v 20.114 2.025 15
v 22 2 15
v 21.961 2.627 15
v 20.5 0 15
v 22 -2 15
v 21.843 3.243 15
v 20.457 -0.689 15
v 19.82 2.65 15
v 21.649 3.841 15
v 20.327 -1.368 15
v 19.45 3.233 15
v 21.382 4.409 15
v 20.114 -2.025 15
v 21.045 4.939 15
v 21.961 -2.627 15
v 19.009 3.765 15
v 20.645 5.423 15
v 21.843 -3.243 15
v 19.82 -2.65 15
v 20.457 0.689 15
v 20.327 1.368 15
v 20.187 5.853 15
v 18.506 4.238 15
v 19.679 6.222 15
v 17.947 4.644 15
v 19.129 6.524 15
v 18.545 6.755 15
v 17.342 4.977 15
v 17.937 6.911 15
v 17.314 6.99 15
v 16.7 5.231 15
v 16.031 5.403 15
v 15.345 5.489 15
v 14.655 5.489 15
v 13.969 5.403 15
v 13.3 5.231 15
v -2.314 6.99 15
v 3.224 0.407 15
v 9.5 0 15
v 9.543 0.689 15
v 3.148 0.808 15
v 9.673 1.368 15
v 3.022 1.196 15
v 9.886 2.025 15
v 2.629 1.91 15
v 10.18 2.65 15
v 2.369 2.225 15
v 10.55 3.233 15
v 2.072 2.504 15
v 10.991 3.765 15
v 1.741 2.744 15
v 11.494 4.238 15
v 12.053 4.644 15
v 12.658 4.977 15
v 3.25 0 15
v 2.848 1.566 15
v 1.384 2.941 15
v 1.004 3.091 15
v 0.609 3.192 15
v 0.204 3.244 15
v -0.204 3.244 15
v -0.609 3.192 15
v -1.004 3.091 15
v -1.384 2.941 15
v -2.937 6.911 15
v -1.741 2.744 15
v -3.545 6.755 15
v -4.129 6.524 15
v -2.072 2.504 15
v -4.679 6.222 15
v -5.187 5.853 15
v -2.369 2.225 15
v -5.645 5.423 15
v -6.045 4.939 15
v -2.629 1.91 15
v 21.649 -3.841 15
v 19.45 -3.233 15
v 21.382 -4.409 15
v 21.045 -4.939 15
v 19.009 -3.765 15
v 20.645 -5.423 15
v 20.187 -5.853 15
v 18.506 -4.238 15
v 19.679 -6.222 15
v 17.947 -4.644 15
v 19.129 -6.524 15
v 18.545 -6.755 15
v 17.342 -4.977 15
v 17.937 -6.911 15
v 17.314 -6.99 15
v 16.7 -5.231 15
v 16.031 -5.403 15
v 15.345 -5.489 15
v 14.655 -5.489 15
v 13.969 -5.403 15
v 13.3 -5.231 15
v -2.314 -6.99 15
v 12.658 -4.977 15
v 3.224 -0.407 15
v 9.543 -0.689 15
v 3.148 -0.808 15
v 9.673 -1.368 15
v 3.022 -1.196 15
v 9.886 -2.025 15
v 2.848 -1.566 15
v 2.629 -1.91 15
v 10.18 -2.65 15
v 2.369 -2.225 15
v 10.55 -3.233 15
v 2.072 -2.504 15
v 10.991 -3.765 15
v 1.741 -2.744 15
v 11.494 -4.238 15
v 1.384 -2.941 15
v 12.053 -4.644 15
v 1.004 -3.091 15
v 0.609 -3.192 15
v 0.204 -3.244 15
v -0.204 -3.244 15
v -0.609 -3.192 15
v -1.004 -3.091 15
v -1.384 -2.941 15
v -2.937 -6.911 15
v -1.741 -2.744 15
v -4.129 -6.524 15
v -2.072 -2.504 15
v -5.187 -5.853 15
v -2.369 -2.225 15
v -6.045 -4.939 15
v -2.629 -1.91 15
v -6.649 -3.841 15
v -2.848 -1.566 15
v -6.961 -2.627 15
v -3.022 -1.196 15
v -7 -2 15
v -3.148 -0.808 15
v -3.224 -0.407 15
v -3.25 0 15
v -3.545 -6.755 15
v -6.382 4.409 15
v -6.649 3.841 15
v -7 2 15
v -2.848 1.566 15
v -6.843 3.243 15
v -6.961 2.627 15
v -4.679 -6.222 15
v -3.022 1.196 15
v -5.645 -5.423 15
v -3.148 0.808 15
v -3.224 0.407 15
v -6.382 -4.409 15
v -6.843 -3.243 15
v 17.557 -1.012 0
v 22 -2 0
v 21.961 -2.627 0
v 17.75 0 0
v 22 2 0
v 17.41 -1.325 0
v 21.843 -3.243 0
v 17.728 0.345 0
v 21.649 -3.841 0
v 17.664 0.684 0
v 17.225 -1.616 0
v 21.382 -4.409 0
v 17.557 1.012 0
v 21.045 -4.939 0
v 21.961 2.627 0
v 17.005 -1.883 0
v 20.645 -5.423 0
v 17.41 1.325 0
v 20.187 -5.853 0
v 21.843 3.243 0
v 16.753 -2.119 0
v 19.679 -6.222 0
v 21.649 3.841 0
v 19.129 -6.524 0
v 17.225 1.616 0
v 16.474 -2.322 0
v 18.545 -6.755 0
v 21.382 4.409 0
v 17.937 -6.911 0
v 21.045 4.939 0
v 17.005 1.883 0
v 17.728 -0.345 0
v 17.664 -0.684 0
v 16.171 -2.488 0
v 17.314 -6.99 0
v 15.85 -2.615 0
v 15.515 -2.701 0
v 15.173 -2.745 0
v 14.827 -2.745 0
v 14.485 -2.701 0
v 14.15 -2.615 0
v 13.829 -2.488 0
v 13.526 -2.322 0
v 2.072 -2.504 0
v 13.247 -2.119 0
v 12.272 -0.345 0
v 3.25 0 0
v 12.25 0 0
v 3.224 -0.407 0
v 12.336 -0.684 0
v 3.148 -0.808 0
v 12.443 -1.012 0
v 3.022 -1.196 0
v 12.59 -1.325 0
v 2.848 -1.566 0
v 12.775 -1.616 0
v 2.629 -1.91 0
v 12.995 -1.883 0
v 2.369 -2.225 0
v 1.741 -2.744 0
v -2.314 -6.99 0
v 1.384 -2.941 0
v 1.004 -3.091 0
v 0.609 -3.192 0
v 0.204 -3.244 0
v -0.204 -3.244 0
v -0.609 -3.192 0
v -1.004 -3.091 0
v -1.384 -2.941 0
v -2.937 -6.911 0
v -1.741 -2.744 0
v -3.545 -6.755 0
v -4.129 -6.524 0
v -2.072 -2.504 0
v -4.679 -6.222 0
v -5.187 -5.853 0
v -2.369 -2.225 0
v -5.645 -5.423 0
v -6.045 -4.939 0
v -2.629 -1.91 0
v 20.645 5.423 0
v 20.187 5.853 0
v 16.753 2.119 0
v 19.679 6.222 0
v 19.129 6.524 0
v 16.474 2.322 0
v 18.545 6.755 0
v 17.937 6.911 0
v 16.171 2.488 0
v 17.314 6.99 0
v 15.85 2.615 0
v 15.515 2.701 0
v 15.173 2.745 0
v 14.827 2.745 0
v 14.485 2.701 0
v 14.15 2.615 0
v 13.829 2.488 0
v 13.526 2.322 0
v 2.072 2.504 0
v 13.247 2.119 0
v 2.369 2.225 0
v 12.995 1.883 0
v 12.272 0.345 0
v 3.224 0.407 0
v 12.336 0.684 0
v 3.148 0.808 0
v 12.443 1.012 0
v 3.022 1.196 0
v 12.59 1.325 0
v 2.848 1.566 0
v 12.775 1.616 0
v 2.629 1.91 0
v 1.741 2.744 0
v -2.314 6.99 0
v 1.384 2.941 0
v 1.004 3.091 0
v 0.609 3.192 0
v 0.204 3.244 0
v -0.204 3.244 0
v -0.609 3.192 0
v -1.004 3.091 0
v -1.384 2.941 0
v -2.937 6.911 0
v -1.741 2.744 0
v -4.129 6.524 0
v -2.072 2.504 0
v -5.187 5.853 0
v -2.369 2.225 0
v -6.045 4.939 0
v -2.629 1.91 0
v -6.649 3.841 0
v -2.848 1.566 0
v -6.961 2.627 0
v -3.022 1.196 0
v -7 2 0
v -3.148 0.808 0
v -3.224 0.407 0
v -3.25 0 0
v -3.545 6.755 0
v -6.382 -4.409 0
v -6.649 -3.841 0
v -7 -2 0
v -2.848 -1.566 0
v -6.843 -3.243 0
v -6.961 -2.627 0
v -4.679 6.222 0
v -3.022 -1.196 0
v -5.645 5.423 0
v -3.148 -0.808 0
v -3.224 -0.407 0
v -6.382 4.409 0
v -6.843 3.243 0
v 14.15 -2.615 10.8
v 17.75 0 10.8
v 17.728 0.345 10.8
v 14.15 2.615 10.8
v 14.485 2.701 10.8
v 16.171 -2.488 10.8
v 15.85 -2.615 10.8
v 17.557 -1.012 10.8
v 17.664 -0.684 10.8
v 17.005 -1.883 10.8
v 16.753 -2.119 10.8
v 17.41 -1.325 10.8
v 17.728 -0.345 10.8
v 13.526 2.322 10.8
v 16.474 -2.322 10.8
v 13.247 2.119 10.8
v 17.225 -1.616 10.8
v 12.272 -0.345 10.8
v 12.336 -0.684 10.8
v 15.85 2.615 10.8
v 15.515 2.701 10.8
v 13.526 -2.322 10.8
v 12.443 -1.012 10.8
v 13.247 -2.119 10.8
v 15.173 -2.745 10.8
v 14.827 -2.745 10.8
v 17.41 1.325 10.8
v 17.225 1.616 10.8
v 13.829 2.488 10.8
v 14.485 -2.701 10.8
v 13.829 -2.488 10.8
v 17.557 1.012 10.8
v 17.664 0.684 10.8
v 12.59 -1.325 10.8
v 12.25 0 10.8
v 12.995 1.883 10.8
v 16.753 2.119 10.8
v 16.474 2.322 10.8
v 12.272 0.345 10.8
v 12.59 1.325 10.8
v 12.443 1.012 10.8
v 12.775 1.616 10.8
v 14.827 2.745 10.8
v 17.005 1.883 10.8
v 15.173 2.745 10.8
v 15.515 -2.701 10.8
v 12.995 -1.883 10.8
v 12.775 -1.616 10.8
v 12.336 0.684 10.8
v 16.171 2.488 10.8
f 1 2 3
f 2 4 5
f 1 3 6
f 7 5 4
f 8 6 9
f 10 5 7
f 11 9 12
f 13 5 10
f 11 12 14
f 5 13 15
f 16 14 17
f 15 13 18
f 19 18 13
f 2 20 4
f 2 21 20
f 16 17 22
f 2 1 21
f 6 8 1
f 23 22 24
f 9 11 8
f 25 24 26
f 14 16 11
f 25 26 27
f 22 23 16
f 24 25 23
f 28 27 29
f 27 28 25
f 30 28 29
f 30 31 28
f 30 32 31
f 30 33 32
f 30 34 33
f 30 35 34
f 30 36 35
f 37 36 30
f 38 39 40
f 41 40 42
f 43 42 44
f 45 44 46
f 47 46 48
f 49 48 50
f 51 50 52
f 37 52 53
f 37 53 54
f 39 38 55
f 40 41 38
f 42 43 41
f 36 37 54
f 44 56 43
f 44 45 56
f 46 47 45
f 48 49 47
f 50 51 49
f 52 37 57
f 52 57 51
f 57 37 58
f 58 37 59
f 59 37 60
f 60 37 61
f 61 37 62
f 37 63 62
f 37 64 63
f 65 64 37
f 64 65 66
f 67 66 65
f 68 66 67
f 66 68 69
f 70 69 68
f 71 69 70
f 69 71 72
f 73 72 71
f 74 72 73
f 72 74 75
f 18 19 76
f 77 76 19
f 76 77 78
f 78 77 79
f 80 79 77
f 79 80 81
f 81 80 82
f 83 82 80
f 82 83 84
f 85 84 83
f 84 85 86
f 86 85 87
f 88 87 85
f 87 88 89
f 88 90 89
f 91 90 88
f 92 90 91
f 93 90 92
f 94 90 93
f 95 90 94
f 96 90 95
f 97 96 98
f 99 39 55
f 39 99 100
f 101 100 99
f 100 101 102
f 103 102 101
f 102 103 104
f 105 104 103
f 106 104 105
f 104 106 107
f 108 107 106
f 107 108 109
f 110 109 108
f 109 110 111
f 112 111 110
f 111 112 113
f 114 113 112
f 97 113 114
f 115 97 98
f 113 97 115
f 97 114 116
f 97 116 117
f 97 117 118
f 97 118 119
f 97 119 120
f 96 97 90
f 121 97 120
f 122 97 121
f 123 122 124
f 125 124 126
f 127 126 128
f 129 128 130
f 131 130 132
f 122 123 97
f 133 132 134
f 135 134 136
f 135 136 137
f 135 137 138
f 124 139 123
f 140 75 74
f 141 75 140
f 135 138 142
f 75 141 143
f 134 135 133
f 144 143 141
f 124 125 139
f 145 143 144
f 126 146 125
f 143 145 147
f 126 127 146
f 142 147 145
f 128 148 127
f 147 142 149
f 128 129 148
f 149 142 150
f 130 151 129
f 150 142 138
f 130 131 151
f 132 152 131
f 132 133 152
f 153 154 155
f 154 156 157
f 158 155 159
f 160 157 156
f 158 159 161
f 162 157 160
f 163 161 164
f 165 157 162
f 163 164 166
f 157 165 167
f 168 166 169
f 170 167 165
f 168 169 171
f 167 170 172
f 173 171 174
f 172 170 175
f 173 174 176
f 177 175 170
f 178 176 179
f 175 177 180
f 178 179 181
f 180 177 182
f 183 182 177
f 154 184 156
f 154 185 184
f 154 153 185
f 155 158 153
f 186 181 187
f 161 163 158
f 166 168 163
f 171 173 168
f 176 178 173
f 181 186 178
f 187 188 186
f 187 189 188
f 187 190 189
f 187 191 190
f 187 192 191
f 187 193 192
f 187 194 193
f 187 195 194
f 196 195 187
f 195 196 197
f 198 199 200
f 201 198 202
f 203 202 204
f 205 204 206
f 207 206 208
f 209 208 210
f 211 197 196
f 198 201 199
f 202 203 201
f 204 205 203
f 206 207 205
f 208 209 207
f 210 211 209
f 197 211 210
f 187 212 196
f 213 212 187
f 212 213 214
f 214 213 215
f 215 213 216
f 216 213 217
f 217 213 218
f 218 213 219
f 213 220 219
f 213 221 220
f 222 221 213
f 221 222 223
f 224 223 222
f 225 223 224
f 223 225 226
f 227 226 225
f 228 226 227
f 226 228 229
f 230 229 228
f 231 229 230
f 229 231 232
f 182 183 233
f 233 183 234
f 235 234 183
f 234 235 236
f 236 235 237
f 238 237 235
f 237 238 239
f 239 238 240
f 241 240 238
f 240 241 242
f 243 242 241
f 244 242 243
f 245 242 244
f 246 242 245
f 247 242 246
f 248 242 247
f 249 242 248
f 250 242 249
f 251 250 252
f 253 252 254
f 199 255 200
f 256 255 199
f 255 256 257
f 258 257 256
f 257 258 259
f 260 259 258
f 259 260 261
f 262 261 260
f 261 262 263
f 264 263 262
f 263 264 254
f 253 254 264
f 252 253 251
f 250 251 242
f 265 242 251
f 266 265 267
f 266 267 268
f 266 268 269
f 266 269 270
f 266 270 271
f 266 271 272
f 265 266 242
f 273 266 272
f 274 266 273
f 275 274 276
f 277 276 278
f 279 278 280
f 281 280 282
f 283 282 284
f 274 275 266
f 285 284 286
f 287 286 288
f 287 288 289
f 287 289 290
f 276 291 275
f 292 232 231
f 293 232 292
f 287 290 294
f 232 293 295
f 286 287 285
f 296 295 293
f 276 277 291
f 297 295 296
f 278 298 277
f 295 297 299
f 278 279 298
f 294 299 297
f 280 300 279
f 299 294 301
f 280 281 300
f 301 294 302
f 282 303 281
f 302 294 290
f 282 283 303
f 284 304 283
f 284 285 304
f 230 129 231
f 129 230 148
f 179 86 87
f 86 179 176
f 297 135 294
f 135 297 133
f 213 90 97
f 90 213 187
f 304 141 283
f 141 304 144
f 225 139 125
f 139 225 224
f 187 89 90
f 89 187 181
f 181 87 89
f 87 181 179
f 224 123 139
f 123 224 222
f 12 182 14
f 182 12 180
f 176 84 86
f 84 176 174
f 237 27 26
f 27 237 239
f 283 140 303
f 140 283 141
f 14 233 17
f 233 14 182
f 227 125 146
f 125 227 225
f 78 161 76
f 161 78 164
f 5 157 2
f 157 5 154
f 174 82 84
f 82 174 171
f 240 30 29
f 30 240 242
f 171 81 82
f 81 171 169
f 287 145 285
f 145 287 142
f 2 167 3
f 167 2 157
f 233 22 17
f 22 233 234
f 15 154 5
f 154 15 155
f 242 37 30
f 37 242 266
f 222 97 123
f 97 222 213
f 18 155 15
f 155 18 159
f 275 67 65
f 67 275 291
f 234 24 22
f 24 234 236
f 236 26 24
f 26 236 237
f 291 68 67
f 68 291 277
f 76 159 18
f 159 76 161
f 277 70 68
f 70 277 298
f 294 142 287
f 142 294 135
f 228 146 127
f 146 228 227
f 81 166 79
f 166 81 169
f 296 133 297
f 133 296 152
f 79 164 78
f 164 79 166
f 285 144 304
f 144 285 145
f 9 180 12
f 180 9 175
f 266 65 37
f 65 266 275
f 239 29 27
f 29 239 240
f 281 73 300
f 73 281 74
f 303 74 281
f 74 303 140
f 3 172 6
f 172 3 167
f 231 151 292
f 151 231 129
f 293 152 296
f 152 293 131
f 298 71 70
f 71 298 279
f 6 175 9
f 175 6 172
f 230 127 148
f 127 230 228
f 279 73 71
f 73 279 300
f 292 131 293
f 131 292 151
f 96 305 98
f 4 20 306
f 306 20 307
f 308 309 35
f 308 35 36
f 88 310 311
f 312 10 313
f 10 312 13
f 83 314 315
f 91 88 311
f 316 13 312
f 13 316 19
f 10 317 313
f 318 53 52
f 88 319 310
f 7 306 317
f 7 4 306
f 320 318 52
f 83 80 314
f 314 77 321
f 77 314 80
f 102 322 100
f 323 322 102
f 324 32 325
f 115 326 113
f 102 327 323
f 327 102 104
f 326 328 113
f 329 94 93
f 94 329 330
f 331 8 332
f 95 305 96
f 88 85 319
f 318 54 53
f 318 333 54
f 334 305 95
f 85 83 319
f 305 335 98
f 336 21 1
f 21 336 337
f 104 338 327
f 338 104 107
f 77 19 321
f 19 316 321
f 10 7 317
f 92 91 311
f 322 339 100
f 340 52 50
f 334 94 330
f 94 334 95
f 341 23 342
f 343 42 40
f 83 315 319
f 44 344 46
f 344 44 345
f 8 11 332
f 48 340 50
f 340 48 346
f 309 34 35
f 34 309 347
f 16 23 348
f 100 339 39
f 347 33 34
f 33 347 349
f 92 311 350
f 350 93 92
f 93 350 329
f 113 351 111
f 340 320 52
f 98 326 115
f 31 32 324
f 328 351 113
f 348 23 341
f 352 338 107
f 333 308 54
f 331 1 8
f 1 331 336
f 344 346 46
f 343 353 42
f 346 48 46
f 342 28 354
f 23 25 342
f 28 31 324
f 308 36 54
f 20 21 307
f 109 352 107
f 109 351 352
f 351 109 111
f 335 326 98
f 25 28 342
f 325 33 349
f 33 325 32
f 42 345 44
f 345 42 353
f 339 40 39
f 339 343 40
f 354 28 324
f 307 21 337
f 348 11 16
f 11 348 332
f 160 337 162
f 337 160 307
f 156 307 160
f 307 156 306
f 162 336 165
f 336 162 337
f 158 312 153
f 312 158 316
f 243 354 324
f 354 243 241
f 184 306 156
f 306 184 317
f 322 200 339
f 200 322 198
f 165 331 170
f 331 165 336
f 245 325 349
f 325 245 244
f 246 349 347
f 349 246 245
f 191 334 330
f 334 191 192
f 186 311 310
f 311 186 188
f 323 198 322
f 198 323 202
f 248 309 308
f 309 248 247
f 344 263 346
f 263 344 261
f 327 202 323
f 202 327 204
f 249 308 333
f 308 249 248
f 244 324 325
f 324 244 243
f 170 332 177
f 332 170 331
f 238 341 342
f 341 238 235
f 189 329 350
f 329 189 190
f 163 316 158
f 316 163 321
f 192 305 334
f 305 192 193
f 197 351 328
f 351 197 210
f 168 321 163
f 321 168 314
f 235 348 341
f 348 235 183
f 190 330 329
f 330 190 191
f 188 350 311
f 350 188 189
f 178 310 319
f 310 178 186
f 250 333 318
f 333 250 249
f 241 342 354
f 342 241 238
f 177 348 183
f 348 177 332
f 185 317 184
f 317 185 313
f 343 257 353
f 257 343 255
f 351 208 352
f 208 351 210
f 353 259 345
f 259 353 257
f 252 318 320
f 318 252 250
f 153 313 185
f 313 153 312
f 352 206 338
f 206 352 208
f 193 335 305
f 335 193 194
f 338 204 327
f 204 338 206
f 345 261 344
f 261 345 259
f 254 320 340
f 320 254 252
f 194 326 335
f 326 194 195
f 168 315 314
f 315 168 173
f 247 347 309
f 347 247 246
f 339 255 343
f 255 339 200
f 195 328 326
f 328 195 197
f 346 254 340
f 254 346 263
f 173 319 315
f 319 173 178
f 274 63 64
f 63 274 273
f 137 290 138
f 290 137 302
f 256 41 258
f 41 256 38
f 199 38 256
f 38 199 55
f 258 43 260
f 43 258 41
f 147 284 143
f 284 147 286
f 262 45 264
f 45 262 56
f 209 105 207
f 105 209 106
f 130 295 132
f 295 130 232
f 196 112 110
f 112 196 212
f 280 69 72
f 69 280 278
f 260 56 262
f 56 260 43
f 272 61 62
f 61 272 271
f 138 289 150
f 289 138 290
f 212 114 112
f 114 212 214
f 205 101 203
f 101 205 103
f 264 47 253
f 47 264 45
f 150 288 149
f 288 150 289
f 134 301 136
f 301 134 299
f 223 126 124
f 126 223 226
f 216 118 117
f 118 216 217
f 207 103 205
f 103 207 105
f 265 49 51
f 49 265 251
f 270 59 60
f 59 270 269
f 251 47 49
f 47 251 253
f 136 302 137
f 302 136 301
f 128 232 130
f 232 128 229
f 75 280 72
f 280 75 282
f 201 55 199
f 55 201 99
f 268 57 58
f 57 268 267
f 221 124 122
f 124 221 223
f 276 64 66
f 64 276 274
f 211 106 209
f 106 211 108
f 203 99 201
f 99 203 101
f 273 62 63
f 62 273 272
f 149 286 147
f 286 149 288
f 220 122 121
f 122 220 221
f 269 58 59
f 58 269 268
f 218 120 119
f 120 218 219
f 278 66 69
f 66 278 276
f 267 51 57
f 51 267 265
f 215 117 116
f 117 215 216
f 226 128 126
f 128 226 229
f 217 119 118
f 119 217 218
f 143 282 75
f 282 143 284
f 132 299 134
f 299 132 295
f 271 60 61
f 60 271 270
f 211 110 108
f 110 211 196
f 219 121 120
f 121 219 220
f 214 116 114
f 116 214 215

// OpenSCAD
$fn = 50;


difference() {
	union() {
		cylinder(h = 15, r = 7.0000000000);
		translate(v = [7.5000000000, 0.0000000000, 0]) {
			hull() {
				translate(v = [-9.5000000000, 2.0000000000, 0]) {
					cylinder(h = 15, r = 5);
				}
				translate(v = [9.5000000000, 2.0000000000, 0]) {
					cylinder(h = 15, r = 5);
				}
				translate(v = [-9.5000000000, -2.0000000000, 0]) {
					cylinder(h = 15, r = 5);
				}
				translate(v = [9.5000000000, -2.0000000000, 0]) {
					cylinder(h = 15, r = 5);
				}
			}
		}
		translate(v = [7.5000000000, 0.0000000000, 0]) {
			hull() {
				translate(v = [-9.5000000000, 2.0000000000, 0]) {
					cylinder(h = 15, r = 5);
				}
				translate(v = [9.5000000000, 2.0000000000, 0]) {
					cylinder(h = 15, r = 5);
				}
				translate(v = [-9.5000000000, -2.0000000000, 0]) {
					cylinder(h = 15, r = 5);
				}
				translate(v = [9.5000000000, -2.0000000000, 0]) {
					cylinder(h = 15, r = 5);
				}
			}
		}
	}
	union() {
		translate(v = [15.0000000000, 0.0000000000, 15]) {
			rotate(a = [0, 0, 0]) {
				difference() {
					union() {
						#translate(v = [0, 0, -15.0000000000]) {
							cylinder(h = 15, r = 2.2500000000);
						}
						#translate(v = [0, 0, -4.2000000000]) {
							cylinder(h = 4.2000000000, r1 = 2.7500000000, r2 = 5.5000000000);
						}
						#translate(v = [0, 0, -15.0000000000]) {
							cylinder(h = 15, r = 2.7500000000);
						}
						#translate(v = [0, 0, -15.0000000000]) {
							cylinder(h = 15, r = 2.2500000000);
						}
					}
					union();
				}
			}
		}
		translate(v = [15.0000000000, 0.0000000000, 15]) {
			rotate(a = [0, 0, 0]) {
				difference() {
					union() {
						#translate(v = [0, 0, -15.0000000000]) {
							cylinder(h = 15, r = 2.2500000000);
						}
						#translate(v = [0, 0, -4.2000000000]) {
							cylinder(h = 4.2000000000, r1 = 2.7500000000, r2 = 5.5000000000);
						}
						#translate(v = [0, 0, -15.0000000000]) {
							cylinder(h = 15, r = 2.7500000000);
						}
						#translate(v = [0, 0, -15.0000000000]) {
							cylinder(h = 15, r = 2.2500000000);
						}
					}
					union();
				}
			}
		}
		translate(v = [0, 0, -100]) {
			cylinder(h = 200, r = 3.2500000000);
		}
		translate(v = [0, 0, -100]) {
			cylinder(h = 200, r = 1.8000000000);
		}
	}
}
